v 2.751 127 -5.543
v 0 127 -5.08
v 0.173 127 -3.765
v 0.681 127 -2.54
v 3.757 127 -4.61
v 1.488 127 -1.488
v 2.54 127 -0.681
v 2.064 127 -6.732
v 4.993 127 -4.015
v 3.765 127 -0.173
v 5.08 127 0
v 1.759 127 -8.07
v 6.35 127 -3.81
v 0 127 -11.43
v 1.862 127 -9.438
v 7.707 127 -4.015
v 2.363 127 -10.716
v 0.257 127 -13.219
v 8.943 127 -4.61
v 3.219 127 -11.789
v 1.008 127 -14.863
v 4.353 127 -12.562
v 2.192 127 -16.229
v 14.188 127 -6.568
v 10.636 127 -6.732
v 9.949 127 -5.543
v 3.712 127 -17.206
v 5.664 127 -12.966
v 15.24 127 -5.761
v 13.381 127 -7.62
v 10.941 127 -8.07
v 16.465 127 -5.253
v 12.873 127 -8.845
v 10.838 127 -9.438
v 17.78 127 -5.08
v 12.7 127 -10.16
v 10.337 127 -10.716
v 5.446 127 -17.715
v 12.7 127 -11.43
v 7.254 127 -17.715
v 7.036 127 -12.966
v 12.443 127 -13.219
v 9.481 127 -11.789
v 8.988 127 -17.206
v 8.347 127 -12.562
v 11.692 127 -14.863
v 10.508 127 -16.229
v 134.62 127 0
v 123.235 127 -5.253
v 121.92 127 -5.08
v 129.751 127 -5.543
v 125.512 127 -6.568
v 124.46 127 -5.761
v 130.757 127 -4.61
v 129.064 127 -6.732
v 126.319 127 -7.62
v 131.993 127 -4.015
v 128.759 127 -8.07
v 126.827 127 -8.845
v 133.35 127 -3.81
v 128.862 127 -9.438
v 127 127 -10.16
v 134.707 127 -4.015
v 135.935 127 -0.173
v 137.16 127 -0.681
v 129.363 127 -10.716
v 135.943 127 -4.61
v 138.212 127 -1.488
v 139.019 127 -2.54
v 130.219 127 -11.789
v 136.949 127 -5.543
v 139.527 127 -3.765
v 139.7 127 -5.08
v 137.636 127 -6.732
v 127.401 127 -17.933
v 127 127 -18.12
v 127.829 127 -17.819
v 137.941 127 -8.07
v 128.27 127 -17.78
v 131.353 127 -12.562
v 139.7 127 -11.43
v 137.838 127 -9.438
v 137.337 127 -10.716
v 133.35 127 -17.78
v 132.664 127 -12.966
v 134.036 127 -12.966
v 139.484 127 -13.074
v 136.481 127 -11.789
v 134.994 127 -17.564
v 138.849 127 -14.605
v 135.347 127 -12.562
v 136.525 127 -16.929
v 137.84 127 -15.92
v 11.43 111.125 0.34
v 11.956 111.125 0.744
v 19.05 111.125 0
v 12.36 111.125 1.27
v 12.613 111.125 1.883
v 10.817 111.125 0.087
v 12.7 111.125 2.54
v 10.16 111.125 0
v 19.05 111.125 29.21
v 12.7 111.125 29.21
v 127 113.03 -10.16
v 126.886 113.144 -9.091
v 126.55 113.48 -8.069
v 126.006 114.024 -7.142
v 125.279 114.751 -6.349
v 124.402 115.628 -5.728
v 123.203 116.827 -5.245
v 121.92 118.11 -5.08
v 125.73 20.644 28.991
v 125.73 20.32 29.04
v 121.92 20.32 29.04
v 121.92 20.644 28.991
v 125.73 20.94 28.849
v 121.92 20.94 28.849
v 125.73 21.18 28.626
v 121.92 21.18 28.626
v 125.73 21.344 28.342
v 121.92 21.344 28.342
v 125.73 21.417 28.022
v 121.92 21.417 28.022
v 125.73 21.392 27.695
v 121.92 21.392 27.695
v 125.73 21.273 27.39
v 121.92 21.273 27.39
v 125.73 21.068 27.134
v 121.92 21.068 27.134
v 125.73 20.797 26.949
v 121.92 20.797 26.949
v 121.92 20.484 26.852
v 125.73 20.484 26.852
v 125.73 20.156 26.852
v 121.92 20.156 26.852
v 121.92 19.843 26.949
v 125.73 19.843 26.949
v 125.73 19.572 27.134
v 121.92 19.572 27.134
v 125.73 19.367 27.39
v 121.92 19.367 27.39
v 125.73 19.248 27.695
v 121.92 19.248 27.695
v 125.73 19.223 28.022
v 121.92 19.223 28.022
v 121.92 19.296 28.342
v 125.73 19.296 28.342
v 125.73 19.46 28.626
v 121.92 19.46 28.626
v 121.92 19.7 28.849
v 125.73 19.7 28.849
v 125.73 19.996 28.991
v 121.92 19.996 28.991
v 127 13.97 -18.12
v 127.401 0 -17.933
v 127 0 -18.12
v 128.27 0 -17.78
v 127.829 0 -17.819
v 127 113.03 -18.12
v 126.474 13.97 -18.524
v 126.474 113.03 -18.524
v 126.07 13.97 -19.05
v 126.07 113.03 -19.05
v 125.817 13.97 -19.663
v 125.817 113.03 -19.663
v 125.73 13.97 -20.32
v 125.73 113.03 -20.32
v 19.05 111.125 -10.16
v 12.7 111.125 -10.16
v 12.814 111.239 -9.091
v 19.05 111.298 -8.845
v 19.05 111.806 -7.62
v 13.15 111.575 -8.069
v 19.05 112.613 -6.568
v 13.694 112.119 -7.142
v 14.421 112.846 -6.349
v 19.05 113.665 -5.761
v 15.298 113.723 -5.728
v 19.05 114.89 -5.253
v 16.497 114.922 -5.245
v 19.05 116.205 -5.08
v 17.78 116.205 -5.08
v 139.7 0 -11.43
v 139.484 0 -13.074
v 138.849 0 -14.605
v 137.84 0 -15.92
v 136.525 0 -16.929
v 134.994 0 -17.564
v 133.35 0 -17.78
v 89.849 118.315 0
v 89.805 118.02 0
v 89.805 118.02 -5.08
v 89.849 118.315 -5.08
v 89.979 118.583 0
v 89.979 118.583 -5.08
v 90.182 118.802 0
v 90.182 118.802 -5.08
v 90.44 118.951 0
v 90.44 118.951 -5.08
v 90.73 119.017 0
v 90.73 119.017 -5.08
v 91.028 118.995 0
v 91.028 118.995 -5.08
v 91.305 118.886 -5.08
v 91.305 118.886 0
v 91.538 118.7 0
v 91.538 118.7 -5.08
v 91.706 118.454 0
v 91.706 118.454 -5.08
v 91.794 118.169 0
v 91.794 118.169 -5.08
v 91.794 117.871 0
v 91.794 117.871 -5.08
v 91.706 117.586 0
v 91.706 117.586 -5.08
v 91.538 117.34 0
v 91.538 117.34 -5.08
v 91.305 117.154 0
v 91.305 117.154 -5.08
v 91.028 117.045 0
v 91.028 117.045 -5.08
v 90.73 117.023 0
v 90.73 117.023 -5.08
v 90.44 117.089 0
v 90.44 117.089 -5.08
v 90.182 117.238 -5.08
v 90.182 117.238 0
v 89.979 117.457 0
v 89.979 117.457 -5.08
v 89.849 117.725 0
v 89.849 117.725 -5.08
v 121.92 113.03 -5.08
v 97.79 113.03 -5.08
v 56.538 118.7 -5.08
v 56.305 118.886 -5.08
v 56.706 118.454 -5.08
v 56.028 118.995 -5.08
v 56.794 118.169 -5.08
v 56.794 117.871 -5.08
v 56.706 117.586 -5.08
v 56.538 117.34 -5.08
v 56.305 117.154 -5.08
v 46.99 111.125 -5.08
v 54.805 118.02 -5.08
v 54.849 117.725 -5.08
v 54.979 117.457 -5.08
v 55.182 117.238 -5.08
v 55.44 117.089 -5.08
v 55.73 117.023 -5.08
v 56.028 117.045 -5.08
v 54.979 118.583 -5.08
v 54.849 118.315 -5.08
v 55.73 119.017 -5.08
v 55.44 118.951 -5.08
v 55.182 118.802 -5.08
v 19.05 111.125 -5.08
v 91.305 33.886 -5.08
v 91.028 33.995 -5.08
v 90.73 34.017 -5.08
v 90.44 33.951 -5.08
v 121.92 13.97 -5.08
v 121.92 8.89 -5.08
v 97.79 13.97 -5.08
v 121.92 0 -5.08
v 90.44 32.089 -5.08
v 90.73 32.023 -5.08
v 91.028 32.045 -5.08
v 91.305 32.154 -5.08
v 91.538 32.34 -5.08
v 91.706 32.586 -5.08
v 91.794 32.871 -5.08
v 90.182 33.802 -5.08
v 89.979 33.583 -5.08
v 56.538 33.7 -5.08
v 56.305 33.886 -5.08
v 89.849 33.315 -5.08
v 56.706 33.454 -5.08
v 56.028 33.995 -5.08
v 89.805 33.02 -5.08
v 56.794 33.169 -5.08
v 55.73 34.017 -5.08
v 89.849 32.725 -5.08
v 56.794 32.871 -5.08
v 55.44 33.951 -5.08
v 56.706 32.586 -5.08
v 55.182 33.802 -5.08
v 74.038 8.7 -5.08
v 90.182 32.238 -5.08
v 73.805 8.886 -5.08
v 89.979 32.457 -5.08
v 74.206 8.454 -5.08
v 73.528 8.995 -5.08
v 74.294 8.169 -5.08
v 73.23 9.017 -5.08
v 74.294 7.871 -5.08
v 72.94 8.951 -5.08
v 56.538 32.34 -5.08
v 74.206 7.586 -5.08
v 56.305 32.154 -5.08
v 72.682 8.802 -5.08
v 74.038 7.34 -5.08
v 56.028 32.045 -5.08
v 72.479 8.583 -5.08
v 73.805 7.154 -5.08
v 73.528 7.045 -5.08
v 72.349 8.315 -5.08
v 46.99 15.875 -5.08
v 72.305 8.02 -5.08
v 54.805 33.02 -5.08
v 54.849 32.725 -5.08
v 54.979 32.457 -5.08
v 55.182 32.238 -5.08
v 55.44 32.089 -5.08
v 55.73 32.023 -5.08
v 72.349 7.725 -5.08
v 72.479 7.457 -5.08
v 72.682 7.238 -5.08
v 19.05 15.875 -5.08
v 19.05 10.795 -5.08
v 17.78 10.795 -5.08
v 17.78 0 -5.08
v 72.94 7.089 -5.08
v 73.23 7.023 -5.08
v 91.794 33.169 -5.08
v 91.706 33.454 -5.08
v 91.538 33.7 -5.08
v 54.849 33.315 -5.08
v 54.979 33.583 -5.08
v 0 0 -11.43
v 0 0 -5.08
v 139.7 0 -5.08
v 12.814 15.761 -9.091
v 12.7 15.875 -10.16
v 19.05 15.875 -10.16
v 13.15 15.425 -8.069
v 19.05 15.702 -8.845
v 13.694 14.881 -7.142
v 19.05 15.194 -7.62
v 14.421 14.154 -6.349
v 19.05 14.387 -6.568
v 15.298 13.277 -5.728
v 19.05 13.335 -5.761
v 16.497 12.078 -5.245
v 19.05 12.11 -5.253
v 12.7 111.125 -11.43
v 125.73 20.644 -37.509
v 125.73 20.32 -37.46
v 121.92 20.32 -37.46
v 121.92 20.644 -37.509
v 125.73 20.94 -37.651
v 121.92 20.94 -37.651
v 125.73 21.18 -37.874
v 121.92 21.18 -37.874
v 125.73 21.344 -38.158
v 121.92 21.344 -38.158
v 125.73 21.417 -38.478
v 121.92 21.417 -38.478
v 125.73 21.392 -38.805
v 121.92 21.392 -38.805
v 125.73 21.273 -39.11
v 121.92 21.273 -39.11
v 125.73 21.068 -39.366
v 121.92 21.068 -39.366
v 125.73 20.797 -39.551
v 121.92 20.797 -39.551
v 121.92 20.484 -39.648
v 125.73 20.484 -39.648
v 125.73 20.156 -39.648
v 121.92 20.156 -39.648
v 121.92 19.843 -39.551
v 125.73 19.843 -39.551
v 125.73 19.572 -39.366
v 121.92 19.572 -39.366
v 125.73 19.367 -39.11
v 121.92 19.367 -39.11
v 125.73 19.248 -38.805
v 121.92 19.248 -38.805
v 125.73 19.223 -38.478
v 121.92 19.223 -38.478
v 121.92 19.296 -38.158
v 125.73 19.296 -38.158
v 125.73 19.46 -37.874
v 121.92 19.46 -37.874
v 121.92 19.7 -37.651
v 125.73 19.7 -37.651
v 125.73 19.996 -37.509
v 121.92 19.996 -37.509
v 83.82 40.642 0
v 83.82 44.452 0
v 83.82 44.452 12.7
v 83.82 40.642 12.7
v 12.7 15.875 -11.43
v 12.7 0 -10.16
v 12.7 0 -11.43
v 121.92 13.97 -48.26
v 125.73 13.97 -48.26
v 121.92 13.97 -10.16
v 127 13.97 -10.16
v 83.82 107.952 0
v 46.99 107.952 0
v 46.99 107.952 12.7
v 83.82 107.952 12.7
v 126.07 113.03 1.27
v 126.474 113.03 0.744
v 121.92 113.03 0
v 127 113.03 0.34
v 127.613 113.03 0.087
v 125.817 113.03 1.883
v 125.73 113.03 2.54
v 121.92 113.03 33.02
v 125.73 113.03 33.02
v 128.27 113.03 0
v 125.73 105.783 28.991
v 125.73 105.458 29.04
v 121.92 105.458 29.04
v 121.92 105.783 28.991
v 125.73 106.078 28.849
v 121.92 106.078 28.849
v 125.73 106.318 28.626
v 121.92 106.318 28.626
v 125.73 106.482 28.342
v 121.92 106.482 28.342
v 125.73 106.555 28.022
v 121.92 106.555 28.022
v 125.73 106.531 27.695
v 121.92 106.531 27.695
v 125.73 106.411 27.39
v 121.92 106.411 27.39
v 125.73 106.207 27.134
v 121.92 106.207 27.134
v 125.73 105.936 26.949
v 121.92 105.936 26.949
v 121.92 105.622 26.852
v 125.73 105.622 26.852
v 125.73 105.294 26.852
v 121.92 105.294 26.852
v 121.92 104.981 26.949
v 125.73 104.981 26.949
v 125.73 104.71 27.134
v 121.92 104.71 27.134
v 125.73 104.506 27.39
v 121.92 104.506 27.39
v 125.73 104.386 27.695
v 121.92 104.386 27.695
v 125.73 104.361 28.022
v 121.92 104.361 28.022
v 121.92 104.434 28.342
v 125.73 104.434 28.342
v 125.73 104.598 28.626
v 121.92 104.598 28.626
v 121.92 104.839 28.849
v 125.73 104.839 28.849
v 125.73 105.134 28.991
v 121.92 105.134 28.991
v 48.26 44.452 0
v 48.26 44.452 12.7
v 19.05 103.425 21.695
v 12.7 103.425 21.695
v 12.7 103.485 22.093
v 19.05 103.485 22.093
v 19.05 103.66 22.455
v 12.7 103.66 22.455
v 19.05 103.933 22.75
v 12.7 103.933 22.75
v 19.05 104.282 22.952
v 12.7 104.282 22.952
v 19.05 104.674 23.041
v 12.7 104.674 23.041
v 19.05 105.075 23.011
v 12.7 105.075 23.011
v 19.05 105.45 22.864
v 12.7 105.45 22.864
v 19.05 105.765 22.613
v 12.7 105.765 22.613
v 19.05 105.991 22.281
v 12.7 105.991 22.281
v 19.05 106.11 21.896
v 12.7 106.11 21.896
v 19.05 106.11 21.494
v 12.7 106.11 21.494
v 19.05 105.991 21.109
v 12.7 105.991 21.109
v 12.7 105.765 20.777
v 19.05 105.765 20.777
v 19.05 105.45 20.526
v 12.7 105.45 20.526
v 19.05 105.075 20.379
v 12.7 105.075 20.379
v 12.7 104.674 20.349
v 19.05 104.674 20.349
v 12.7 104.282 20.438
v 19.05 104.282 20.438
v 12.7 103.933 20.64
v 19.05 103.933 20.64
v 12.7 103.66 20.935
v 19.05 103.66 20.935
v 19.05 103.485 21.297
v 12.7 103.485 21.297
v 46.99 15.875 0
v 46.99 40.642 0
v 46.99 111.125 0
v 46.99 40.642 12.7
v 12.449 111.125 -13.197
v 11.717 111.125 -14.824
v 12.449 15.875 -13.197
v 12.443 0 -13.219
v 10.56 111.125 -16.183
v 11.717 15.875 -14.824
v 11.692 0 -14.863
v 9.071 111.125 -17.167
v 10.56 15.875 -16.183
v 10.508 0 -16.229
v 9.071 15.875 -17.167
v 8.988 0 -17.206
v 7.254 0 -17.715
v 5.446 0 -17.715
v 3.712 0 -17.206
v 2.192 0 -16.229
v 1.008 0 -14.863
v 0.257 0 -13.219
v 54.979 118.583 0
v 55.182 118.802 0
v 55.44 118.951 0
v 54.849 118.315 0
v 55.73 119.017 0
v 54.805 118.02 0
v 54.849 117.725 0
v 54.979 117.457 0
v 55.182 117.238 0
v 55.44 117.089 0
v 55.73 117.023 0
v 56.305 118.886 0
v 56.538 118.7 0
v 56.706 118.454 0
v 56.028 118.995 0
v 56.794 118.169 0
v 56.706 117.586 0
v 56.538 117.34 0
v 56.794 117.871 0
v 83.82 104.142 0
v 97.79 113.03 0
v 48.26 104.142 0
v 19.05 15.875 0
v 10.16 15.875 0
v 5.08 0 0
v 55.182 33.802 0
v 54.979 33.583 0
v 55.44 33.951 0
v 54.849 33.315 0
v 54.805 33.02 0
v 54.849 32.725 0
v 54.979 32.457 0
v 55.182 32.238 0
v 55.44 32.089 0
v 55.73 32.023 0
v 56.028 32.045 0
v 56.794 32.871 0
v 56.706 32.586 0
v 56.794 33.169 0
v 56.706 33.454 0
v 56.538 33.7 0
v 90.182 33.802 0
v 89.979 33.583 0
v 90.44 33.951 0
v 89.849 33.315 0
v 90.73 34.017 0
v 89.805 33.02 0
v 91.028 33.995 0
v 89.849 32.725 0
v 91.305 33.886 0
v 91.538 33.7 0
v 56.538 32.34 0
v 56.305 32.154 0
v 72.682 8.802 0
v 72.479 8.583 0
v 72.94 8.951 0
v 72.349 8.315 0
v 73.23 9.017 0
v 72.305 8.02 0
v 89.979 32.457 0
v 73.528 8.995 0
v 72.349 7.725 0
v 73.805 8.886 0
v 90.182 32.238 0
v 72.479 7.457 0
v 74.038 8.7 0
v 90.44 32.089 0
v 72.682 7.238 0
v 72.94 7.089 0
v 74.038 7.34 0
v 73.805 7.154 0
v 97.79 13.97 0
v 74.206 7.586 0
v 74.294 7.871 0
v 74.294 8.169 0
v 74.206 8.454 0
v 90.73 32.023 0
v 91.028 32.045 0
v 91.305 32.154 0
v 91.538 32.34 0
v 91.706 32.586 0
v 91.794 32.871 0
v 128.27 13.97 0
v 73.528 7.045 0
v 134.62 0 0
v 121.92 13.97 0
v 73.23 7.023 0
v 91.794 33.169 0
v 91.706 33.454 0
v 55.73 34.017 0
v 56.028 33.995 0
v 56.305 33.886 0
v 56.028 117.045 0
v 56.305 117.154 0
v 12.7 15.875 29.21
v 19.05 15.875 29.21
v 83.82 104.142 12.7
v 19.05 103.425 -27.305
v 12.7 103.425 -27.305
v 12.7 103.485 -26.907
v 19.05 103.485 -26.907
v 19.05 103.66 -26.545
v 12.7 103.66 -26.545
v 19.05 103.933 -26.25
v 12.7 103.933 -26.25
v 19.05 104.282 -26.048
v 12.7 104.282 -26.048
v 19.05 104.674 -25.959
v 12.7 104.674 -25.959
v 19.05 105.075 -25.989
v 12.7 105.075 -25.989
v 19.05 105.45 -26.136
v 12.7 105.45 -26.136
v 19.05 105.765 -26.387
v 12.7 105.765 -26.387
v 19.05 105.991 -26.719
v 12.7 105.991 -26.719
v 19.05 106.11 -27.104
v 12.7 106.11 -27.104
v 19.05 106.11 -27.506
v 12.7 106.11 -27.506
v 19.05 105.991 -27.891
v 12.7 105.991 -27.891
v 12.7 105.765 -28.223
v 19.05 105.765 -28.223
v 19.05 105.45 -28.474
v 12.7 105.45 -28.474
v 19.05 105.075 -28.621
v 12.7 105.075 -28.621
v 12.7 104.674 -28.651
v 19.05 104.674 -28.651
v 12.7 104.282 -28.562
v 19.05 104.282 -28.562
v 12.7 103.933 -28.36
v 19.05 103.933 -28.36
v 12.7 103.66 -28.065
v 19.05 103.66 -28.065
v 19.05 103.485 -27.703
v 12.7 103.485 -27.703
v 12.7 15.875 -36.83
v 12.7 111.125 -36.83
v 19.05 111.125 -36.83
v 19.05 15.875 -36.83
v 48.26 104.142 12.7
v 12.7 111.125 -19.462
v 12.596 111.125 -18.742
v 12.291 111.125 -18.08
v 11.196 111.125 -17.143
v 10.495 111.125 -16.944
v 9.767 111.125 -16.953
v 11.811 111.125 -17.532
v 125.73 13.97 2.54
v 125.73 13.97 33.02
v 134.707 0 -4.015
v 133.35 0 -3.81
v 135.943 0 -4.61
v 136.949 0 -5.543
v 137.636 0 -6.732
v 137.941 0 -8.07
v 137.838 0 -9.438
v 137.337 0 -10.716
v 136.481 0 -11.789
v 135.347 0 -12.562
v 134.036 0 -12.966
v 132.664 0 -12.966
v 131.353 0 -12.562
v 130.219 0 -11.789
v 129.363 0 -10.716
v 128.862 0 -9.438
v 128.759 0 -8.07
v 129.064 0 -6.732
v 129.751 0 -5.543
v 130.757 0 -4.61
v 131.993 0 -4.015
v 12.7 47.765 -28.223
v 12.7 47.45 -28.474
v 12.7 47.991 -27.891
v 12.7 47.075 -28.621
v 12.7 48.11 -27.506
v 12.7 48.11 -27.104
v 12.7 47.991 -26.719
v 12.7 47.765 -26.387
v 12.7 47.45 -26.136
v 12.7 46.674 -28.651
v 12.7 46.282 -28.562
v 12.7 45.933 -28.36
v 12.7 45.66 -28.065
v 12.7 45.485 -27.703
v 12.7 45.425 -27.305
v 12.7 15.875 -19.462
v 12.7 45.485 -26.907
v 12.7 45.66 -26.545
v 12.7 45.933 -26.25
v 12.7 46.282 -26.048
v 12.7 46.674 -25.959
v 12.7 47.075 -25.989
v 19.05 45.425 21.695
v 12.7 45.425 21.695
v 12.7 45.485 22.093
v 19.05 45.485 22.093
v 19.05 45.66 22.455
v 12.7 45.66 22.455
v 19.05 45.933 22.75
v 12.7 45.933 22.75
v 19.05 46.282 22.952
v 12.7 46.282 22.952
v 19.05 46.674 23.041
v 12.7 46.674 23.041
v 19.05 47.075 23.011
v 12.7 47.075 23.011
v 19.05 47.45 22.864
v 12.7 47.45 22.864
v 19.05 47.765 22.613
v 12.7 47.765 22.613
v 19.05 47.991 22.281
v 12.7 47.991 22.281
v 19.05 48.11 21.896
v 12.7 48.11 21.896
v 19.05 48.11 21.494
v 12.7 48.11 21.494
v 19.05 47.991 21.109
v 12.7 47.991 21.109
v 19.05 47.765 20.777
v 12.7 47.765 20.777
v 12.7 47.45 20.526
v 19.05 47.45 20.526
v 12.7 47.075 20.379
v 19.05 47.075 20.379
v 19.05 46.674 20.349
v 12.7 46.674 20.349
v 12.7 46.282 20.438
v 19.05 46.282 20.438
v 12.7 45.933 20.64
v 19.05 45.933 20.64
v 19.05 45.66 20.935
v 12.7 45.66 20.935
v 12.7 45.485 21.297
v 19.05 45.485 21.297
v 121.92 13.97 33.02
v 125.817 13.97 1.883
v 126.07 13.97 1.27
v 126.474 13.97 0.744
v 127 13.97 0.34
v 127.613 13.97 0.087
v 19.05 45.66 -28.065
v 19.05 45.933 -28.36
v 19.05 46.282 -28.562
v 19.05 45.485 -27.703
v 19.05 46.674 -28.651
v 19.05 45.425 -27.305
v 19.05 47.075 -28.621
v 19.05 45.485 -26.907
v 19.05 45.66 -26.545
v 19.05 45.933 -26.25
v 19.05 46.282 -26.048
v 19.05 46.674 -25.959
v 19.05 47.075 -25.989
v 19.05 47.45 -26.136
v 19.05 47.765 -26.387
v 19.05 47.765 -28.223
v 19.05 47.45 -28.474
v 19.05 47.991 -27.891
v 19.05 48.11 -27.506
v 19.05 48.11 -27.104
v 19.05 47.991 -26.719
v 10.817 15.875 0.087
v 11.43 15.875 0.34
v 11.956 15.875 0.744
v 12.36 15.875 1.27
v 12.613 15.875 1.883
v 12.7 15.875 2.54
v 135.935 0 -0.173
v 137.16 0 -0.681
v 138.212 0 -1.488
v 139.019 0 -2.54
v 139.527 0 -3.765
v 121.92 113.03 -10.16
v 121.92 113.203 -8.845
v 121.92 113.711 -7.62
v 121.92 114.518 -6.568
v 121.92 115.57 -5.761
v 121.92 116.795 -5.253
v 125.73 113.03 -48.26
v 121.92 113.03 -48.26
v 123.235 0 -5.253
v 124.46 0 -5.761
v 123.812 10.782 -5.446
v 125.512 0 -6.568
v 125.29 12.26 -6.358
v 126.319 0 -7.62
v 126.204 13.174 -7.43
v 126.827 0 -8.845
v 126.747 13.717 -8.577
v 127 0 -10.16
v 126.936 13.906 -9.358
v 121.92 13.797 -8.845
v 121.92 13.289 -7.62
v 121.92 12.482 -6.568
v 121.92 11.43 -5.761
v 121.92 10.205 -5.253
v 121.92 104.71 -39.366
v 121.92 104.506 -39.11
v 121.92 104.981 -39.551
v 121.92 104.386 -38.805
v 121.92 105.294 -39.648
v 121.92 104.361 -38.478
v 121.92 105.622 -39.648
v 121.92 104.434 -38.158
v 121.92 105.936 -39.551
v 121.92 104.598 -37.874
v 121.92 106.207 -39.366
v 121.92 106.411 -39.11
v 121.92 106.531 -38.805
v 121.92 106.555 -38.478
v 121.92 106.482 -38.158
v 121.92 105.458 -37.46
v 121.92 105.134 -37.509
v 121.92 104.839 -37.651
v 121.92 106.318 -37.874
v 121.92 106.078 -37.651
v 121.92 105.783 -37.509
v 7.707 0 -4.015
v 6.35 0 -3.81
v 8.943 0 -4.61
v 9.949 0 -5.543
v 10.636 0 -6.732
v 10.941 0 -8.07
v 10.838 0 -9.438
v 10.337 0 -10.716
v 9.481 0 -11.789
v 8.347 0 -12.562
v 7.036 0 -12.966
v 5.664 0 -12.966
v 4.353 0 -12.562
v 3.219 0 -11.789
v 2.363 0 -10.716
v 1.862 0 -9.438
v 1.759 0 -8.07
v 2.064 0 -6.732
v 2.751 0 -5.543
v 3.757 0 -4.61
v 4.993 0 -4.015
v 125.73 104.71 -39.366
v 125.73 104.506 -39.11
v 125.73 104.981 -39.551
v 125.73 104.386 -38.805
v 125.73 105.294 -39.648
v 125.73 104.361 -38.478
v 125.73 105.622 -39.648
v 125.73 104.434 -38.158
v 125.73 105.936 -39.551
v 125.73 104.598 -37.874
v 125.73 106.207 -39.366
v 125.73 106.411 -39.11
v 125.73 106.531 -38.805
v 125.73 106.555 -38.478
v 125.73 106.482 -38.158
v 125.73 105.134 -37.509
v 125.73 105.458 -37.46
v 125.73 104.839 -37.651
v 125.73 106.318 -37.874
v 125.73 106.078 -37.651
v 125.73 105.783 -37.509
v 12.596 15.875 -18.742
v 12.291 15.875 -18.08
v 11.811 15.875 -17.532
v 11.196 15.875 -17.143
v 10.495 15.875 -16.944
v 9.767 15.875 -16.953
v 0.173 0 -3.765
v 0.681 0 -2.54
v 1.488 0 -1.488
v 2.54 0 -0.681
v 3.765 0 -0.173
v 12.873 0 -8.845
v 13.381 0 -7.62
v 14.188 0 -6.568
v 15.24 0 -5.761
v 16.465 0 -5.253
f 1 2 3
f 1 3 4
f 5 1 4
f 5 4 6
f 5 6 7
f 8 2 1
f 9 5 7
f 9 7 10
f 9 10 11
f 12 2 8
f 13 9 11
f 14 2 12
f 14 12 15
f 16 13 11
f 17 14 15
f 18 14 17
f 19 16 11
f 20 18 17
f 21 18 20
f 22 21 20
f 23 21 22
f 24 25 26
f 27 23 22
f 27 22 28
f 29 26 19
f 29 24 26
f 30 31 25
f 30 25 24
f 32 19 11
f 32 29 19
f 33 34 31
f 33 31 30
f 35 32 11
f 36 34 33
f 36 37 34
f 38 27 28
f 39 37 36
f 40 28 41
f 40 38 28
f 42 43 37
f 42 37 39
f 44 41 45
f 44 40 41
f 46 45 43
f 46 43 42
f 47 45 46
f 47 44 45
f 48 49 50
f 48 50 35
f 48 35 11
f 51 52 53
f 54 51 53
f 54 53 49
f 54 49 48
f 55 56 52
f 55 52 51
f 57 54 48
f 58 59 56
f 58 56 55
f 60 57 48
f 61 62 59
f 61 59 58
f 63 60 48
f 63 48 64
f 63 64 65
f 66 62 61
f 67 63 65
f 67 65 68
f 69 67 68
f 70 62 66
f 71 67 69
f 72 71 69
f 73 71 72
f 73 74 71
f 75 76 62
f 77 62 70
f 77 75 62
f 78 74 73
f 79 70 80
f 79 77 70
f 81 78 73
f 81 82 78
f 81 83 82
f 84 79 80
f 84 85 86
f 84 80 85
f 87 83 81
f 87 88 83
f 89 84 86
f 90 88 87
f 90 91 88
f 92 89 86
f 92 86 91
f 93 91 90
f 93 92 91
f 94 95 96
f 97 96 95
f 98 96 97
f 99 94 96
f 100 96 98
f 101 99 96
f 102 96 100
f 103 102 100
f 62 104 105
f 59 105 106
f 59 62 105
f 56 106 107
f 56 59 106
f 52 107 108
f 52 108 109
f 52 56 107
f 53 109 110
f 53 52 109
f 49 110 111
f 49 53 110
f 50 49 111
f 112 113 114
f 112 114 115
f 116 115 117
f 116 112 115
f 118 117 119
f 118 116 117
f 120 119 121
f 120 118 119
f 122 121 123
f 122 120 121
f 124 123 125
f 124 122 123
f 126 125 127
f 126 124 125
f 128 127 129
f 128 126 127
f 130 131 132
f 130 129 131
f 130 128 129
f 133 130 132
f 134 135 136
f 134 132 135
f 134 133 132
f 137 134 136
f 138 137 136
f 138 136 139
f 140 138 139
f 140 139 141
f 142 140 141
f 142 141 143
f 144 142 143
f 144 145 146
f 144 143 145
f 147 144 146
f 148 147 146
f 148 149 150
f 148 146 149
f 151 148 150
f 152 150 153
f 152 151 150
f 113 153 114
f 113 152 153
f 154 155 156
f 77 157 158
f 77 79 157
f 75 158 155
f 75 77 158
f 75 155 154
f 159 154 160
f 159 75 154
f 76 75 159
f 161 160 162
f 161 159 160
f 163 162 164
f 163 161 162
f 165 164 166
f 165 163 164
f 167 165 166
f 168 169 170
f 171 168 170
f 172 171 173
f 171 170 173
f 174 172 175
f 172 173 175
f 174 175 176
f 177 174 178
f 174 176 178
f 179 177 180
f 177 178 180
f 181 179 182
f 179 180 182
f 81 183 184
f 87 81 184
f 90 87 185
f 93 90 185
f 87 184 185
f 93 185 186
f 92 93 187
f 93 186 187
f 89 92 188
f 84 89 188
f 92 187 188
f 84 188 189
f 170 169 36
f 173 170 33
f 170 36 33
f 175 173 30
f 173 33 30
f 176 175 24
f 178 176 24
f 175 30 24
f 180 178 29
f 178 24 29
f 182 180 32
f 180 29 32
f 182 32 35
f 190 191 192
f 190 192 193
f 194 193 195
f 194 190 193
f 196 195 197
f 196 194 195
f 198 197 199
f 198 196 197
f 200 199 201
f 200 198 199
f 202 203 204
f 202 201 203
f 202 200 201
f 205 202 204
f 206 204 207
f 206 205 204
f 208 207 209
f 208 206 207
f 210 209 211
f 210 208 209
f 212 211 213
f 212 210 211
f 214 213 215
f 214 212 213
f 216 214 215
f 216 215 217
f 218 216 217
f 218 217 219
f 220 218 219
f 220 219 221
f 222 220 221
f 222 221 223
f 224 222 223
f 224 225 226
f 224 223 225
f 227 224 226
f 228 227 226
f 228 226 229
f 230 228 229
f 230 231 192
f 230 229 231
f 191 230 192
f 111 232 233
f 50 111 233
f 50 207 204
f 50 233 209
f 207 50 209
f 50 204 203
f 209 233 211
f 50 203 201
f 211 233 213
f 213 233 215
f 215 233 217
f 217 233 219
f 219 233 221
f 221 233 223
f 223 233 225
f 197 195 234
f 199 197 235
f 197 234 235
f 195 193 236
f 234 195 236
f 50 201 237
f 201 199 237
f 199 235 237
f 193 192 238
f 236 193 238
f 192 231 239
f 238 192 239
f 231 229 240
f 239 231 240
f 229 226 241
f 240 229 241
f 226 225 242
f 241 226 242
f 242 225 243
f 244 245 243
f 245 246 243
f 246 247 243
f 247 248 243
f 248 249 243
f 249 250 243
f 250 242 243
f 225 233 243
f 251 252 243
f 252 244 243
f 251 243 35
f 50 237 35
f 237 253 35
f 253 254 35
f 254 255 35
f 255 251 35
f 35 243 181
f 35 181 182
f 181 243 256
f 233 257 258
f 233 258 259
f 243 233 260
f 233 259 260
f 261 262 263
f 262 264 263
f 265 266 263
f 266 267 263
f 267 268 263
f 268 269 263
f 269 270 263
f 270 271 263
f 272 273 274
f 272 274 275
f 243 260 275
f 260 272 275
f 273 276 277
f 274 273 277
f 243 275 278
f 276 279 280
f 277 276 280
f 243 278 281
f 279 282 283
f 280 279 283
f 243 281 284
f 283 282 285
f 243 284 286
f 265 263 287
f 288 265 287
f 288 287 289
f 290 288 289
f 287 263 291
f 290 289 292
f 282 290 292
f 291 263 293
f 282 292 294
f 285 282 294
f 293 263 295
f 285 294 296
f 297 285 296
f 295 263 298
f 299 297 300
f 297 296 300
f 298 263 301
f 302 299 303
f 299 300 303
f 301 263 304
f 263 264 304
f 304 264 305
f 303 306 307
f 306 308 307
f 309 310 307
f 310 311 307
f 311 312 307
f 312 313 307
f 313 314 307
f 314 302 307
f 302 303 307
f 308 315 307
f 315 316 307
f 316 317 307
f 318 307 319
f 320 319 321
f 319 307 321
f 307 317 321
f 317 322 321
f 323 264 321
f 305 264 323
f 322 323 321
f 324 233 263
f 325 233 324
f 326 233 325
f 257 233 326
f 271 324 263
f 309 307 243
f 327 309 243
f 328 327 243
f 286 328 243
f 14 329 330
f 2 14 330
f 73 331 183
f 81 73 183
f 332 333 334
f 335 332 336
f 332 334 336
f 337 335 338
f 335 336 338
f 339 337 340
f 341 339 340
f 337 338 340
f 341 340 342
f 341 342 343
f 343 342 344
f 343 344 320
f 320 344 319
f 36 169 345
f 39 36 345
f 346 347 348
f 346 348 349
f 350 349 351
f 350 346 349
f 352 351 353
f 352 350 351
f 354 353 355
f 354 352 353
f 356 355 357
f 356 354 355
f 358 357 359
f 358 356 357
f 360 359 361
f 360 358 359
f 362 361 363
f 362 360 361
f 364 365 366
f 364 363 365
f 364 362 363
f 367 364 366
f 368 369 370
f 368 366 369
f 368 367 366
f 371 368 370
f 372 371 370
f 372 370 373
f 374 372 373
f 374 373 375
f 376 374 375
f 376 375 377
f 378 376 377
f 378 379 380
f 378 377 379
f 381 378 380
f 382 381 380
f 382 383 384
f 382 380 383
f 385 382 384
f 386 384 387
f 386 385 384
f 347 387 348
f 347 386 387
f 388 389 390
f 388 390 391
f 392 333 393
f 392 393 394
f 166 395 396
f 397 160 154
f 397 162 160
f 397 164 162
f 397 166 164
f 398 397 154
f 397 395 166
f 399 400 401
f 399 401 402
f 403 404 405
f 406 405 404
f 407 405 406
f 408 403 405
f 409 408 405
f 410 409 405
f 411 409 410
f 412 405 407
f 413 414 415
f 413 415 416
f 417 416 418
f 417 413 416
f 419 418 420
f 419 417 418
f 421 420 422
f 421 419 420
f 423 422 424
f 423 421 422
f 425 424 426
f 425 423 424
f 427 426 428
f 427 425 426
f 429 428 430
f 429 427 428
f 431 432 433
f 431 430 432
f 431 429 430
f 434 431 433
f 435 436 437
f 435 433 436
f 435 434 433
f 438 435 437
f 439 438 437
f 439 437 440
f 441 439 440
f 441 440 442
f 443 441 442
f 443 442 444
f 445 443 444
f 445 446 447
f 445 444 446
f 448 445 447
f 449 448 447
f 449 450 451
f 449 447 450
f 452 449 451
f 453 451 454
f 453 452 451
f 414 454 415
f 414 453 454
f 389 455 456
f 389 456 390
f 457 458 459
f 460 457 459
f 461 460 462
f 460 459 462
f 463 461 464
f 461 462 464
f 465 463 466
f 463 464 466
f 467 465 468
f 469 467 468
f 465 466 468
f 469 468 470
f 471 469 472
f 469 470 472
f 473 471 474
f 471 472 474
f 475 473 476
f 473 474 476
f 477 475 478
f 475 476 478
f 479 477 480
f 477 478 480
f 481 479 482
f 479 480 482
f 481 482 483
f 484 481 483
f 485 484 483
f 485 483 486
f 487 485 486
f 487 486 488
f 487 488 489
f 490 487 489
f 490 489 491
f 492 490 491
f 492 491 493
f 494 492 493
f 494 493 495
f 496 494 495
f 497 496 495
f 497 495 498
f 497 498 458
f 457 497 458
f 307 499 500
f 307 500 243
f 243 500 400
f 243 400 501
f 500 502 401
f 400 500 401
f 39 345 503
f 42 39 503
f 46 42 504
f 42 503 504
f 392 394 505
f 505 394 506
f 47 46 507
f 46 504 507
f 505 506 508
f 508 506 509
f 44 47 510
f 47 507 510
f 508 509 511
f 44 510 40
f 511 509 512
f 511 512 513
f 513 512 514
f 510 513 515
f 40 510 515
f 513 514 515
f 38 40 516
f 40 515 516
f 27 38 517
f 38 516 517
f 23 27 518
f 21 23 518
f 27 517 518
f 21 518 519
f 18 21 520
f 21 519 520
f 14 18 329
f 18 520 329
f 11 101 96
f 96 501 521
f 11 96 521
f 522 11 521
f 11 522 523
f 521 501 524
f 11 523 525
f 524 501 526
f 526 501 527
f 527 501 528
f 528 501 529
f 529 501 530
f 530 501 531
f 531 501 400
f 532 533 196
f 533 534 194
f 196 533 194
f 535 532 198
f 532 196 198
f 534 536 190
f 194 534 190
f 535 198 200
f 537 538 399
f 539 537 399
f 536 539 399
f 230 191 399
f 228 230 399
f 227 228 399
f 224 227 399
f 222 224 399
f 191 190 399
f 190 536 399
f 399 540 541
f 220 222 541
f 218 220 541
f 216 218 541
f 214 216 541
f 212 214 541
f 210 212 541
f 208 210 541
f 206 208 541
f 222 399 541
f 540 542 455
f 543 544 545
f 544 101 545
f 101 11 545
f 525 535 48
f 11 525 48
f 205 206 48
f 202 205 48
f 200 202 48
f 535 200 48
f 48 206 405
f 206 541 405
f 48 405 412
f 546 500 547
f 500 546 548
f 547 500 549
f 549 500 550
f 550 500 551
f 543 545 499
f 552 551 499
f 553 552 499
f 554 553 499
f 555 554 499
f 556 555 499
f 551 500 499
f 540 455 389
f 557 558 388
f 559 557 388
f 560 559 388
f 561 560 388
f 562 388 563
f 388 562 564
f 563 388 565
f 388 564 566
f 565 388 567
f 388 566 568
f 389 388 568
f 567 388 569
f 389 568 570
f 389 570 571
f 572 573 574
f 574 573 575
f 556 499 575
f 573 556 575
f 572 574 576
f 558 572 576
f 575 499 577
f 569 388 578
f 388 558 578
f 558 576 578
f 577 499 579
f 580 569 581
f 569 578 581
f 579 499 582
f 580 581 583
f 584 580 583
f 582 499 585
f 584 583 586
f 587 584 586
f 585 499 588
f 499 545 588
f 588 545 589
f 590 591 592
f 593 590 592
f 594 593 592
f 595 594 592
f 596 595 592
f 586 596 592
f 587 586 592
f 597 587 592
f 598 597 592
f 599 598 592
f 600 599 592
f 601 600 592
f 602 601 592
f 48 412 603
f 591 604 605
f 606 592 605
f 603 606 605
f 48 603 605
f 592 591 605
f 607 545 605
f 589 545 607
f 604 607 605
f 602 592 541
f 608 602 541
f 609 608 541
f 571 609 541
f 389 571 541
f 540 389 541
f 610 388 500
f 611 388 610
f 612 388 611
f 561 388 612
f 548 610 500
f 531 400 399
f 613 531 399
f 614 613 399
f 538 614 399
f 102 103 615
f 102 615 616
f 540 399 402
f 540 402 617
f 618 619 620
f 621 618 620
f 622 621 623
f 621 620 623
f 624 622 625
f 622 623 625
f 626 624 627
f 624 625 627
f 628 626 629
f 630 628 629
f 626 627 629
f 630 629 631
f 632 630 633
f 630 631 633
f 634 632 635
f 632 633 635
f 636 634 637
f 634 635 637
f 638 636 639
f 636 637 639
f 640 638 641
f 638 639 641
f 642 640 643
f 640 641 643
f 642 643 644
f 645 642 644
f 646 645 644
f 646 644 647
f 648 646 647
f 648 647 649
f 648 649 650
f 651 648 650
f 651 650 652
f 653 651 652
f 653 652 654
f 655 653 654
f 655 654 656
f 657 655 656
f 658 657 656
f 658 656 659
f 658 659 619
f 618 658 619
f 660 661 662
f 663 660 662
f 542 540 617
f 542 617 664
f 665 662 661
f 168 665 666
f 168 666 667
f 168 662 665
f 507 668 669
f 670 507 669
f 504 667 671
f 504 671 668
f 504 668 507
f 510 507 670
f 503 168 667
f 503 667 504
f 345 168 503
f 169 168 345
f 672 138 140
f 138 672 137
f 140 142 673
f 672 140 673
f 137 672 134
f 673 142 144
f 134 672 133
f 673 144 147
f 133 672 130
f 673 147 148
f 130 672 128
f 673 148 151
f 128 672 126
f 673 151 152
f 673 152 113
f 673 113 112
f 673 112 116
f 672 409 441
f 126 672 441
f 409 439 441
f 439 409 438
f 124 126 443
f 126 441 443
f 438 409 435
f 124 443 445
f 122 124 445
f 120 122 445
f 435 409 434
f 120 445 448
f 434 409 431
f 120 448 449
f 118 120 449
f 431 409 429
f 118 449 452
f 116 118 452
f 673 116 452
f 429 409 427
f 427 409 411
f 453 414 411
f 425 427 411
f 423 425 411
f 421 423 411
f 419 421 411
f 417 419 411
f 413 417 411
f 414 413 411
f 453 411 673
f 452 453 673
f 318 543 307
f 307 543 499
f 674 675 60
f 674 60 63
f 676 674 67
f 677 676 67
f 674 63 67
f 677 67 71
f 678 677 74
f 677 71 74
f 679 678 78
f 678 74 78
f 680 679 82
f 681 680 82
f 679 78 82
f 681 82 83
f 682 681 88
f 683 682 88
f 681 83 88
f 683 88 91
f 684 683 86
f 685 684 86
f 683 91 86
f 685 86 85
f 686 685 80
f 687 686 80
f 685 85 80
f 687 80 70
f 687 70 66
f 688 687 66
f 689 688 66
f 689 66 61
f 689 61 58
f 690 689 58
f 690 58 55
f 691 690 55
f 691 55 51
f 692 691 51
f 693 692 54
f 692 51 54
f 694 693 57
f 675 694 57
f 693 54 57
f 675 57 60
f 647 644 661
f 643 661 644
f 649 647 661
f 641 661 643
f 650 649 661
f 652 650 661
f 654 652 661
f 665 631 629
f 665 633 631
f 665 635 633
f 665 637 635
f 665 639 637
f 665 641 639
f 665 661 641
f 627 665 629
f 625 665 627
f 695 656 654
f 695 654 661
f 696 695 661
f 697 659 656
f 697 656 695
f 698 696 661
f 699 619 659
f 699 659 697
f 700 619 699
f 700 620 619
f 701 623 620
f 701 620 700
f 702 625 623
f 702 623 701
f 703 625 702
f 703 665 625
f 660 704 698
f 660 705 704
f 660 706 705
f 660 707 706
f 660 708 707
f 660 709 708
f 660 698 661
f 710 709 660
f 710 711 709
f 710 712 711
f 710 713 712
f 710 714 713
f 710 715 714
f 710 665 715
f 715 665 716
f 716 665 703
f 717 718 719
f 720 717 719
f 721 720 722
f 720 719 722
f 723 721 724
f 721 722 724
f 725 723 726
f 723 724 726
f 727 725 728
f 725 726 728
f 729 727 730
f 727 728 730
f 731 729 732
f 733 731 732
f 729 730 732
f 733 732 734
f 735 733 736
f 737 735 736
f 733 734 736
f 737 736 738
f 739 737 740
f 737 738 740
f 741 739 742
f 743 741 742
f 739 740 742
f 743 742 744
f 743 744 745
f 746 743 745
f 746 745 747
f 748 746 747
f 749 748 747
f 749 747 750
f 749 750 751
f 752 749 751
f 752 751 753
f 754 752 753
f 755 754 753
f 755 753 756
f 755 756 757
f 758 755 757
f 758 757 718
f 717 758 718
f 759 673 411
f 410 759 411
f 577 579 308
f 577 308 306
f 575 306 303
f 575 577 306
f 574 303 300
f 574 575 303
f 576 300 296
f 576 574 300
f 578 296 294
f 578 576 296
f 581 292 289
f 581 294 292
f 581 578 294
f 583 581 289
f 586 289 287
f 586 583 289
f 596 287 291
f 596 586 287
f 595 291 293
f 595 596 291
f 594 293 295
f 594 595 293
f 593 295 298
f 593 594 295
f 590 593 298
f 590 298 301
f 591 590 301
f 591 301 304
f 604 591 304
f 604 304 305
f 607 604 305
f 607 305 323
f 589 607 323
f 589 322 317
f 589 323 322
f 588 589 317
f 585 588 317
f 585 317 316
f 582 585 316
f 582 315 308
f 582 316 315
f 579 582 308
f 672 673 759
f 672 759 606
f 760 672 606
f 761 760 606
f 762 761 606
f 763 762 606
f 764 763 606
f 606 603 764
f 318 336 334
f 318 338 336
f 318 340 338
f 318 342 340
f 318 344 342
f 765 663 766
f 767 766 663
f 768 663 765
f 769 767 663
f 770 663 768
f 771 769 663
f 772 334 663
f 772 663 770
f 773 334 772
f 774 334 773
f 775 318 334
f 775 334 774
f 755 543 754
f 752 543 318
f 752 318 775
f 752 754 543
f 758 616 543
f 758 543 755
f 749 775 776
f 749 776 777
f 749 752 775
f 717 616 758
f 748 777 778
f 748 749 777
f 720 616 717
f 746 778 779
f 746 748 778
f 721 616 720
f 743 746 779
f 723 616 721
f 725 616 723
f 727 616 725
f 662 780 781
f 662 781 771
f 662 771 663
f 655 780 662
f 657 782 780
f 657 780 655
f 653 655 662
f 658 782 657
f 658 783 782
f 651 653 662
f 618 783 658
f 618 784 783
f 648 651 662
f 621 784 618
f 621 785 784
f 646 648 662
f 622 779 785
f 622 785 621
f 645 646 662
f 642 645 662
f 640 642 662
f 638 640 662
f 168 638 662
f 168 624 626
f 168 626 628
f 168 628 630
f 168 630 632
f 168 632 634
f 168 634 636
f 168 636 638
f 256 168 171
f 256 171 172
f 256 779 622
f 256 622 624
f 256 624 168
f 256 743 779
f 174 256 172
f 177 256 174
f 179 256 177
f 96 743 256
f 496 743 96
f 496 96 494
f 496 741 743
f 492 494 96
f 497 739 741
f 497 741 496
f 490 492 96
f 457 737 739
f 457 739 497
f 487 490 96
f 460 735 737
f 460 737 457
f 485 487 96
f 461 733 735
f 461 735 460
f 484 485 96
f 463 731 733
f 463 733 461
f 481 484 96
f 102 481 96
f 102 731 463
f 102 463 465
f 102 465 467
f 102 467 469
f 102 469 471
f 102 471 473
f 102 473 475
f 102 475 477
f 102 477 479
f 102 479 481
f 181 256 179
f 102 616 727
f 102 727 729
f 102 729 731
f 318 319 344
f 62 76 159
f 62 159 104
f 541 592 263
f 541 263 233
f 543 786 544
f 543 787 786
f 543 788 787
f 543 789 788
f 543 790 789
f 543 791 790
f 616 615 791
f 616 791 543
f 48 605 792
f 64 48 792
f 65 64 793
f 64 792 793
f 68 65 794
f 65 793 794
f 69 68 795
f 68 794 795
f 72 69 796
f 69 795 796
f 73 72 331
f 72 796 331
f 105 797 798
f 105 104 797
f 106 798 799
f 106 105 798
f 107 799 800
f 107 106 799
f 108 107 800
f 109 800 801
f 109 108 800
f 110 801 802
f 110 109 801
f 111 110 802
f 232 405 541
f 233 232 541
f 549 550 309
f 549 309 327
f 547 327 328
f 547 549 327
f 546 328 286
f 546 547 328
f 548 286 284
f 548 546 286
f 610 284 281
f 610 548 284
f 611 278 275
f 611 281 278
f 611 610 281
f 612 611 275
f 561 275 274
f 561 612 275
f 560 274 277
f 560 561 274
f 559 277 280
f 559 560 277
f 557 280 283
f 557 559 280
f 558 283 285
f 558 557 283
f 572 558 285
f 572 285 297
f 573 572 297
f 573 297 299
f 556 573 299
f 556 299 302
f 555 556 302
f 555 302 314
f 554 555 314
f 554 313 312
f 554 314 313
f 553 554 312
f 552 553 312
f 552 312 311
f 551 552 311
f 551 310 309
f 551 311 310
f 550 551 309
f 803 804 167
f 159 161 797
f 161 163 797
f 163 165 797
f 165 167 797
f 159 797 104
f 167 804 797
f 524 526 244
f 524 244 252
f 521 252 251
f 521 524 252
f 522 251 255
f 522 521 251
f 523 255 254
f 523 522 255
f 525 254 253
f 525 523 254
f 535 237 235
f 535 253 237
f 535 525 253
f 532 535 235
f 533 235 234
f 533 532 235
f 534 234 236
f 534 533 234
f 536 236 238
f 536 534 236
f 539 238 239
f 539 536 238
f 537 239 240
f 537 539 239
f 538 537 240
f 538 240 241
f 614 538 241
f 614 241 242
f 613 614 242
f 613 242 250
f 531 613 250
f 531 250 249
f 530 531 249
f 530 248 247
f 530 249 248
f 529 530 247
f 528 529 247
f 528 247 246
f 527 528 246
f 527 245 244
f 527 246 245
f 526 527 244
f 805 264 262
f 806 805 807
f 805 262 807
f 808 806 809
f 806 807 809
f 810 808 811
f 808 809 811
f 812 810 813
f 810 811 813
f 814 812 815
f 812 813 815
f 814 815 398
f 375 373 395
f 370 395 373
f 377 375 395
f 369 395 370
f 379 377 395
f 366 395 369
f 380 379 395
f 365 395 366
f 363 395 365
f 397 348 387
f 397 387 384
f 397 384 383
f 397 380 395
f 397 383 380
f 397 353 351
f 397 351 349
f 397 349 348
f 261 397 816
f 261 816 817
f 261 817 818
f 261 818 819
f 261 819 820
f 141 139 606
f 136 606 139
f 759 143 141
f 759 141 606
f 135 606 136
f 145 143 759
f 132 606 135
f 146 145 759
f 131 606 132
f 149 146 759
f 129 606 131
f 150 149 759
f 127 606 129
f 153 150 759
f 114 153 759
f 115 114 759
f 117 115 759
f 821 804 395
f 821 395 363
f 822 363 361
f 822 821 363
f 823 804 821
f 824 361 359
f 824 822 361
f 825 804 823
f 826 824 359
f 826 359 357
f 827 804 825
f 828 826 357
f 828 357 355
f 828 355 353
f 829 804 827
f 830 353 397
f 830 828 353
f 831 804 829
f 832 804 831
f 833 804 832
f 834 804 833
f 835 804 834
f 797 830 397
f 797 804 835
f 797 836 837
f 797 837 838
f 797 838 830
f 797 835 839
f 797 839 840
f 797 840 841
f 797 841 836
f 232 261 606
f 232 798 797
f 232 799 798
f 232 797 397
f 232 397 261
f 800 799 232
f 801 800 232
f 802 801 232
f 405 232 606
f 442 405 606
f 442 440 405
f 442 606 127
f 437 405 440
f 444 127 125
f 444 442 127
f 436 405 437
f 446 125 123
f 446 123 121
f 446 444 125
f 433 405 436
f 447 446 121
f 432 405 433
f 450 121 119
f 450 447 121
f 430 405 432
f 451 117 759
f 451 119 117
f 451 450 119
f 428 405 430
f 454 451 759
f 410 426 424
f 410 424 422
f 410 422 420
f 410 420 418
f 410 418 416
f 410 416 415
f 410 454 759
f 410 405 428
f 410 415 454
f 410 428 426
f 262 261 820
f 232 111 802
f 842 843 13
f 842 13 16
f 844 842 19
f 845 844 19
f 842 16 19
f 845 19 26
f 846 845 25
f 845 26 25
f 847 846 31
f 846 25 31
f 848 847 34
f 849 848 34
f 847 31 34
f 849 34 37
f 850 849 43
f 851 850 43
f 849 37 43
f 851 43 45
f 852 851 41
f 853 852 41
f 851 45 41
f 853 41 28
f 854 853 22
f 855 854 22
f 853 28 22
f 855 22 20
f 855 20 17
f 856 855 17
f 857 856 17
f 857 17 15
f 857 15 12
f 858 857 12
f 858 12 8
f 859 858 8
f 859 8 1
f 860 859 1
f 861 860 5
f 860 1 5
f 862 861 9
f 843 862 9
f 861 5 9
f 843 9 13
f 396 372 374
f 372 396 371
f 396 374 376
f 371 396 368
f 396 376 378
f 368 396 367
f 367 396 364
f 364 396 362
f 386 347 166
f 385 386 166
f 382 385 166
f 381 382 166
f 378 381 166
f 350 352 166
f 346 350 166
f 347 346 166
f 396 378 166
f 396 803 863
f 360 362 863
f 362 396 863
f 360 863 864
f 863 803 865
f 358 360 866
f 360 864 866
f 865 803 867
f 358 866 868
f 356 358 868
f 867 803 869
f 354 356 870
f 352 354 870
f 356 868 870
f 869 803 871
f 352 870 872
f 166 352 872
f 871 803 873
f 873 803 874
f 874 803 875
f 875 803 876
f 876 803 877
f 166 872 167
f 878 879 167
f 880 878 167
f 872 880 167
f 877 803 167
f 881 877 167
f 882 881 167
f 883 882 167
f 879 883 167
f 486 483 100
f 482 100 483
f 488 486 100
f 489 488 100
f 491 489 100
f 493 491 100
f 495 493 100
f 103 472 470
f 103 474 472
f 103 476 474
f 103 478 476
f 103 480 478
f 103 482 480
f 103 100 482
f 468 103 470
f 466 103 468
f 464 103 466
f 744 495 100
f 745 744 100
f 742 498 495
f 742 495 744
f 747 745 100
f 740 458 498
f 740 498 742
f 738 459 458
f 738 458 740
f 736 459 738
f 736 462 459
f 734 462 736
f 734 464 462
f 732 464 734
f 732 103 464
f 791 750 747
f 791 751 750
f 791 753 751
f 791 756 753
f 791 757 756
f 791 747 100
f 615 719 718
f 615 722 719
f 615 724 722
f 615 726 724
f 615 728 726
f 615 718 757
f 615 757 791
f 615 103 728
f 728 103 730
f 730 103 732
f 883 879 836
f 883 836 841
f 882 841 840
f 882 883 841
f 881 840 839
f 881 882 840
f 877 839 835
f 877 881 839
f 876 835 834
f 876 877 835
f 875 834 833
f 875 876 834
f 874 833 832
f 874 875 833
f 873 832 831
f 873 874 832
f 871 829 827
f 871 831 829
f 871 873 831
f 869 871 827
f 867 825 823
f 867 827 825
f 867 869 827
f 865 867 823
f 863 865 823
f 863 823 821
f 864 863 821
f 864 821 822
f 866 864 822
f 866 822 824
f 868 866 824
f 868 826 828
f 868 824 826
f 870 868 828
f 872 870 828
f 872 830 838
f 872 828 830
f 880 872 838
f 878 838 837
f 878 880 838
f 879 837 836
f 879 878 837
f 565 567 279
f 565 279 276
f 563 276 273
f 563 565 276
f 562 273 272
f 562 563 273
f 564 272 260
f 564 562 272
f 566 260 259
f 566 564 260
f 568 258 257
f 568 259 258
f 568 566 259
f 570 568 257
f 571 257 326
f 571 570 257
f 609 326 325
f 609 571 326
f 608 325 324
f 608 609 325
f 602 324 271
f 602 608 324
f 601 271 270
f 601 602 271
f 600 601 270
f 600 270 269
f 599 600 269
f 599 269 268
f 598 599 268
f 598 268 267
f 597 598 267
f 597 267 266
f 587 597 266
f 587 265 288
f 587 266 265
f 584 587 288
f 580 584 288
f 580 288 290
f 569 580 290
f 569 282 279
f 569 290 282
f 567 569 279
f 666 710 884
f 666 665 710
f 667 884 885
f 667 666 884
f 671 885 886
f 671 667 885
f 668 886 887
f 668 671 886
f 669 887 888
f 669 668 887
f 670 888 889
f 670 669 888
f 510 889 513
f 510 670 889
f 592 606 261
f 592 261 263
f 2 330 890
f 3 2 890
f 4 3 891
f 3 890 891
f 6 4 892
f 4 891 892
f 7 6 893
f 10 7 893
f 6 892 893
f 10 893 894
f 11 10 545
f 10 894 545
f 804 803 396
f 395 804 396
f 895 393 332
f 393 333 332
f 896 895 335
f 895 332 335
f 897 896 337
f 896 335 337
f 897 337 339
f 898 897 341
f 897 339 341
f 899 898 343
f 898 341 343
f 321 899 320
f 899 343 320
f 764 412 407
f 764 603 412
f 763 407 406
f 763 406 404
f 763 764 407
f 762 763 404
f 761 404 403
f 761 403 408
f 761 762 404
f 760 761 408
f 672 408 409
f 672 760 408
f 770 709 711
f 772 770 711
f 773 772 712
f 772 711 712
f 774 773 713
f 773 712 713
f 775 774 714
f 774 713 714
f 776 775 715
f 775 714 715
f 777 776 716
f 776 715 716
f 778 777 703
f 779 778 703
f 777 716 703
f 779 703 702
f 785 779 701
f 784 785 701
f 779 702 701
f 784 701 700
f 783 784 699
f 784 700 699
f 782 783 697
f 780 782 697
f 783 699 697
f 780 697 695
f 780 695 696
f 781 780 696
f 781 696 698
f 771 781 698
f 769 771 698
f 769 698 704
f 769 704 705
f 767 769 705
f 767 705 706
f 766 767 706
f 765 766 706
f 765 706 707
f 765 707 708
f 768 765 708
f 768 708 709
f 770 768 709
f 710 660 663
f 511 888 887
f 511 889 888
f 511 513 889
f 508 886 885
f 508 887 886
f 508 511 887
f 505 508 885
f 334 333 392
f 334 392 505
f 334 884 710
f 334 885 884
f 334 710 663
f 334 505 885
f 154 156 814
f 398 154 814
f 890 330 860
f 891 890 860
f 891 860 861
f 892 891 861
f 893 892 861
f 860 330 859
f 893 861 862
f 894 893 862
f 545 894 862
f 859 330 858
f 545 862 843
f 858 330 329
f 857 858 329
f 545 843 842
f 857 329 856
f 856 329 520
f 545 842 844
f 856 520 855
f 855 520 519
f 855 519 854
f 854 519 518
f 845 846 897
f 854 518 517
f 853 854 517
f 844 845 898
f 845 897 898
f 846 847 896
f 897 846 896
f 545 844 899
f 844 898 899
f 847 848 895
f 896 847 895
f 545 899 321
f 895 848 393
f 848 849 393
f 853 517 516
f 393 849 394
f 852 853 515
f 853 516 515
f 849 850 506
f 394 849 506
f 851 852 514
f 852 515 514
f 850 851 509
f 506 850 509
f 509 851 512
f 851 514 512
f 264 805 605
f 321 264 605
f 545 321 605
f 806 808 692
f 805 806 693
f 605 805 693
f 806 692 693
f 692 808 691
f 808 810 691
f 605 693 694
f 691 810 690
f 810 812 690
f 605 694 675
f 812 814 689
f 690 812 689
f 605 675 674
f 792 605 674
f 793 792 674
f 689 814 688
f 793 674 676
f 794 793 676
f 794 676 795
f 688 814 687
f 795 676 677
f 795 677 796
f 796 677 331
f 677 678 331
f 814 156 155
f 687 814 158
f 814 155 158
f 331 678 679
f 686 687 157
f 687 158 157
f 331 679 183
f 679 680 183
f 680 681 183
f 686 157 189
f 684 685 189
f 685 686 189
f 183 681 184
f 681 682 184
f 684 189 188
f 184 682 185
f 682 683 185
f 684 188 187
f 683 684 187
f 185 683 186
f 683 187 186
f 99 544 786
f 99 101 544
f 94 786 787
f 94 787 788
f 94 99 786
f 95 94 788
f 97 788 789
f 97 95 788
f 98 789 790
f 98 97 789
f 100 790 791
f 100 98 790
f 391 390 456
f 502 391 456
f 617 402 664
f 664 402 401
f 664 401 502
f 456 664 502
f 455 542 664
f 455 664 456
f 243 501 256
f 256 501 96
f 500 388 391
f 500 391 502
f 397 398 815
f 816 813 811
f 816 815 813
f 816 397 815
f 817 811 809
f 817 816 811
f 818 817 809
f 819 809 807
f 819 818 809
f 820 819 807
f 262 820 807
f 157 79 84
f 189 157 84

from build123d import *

# Parameters (mm, degrees)
BOSS_EXTRUDE1_DEPTH      = 127
SKETCH3_R                = 4.60374999999995
SKETCH3_R_2              = 4.603749999999996
CUT_EXTRUDE1_DEPTH       = 127
CUT_EXTRUDE10_DEPTH      = 190.225738207042
CUT_EXTRUDE10_DEPTH_BACK = 190.225738207042
SKETCH19_W               = 27.939999999999998
SKETCH19_H               = 99.05999999999997
BOSS_EXTRUDE6_DEPTH      = 3.8099999999999996
CUT_EXTRUDE11_DEPTH      = 183.54455346572246
CUT_EXTRUDE11_DEPTH_BACK = 183.54455346572246
SKETCH23_R               = 1.0999978000000017
SKETCH23_R_2             = 1.0999978000000061
SKETCH23_R_3             = 1.099997799999995
BOSS_EXTRUDE8_DEPTH      = 31.75
BOSS_EXTRUDE8_DEPTH_BACK = 34.29
CUT_EXTRUDE12_DEPTH      = 194.67395901359583
CUT_EXTRUDE12_DEPTH_BACK = 194.67395901359583
CUT_EXTRUDE13_DEPTH      = 194.67395901359583
CUT_EXTRUDE13_DEPTH_BACK = 194.67395901359583
SKETCH32_R               = 0.9999980000000093
SKETCH34_R               = 1.3499972999999863
SKETCH34_R_2             = 1.349997299999995
SKETCH34_R_3             = 1.3499973000000016
CUT_EXTRUDE15_DEPTH      = 15.239999999999998
BOSS_EXTRUDE10_DEPTH     = 12.7
SKETCH36_W               = 1.2700000000000102
SKETCH36_H               = 12.700000000000014
BOSS_EXTRUDE11_DEPTH     = 99.06
FILLET5_R                = 2.54
FILLET6_R                = 2.54
FILLET7_R                = 5.08


with BuildPart() as part:
    # Sketch2 → Boss-Extrude1 (new body)
    with BuildSketch(Plane(origin=(0, 0, 0), x_dir=(1, 0, 0), z_dir=(0, 1, 0))):
        with BuildLine():
            Line((8.7e-16, 11.429999999999996), (8.7e-16, 5.079999999999999))
            ThreePointArc((8.7e-16, 5.079999999999999), (1.4878975515723396, 1.4878975515723383), (5.080000000000001, 0))
            Line((5.080000000000001, 0), (134.61999999999998, 0))
            ThreePointArc((134.61999999999998, 0), (138.21210244842763, 1.4878975515723387), (139.7, 5.08))
            Line((139.7, 5.08), (139.70000000000002, 11.429999999999996))
            ThreePointArc((139.70000000000002, 11.429999999999996), (137.8401280605346, 15.920128060534589), (133.35, 17.78000000000002))
            Line((133.35, 17.78000000000002), (127, 17.780000000000015))
            Line((127, 17.780000000000015), (127, 11.429999999999996))
            Line((127, 11.429999999999996), (127, 5.079999999999999))
            Line((127, 5.079999999999999), (12.699999999999989, 5.08))
            Line((12.699999999999989, 5.08), (12.699999999999989, 11.429999999999996))
            ThreePointArc((12.699999999999989, 11.429999999999996), (6.349999999999994, 17.77999999999999), (8.7e-16, 11.429999999999996))
        make_face()
    extrude(amount=BOSS_EXTRUDE1_DEPTH)

    # Sketch3 → Cut-Extrude1 (cut)
    with BuildSketch(Plane(origin=(0, 127, 0), x_dir=(1, 0, 0), z_dir=(0, 1, 0))):
        with Locations(Location((133.35, 8.41375, 0), (0, 0, 270))):
            Circle(SKETCH3_R)
        with Locations(Location((6.349999999999994, 8.41375, 0), (0, 0, 270))):
            Circle(SKETCH3_R_2)
    extrude(amount=-CUT_EXTRUDE1_DEPTH, mode=Mode.SUBTRACT)

    # Sketch19 → Cut-Extrude10 (cut, two sides: drawn at the far end of the back side and taken through both)
    with BuildSketch(Plane(origin=(4e-17, 0, -5.08), x_dir=(-1, 0, -1e-17), z_dir=(1e-17, 0, -1)).offset(-CUT_EXTRUDE10_DEPTH_BACK)):
        with Locations((-111.76, 63.5)):
            Rectangle(SKETCH19_W, SKETCH19_H)
    extrude(amount=CUT_EXTRUDE10_DEPTH + CUT_EXTRUDE10_DEPTH_BACK, mode=Mode.SUBTRACT)

    # Sketch20 → Boss-Extrude6 (add)
    with BuildSketch(Plane(origin=(125.73, 0, 9.5e-16), x_dir=(1e-17, 0, -1), z_dir=(1, 0, 1e-17))):
        Polygon((5.08, 113.02999999999999), (48.26, 113.02999999999999), (48.26000000000001, 13.97000000000001), (5.08, 13.97000000000001), (-1.06e-15, 13.97000000000001), (-33.01999999999999, 13.97000000000001), (-33.02, 113.02999999999999), (-1.06e-15, 113.02999999999999), align=None)
    extrude(amount=-BOSS_EXTRUDE6_DEPTH)

    # Sketch23 → Cut-Extrude11 (cut, two sides: drawn at the far end of the back side and taken through both)
    with BuildSketch(Plane.ZY.offset(-121.92000000000002).offset(-CUT_EXTRUDE11_DEPTH_BACK)):
        with Locations((27.94, 105.45831715747836)):
            Circle(SKETCH23_R)
        with Locations((27.94, 20.32000000000001)):
            Circle(SKETCH23_R_2)
        with Locations((-38.55999400000001, 20.32000000000001)):
            Circle(SKETCH23_R_3)
        with Locations((-38.55999400000001, 105.45831715747836)):
            Circle(SKETCH23_R_3)
    extrude(amount=CUT_EXTRUDE11_DEPTH + CUT_EXTRUDE11_DEPTH_BACK, mode=Mode.SUBTRACT)

    # Sketch26 → Boss-Extrude8 (add, two sides: drawn at the far end of the back side and taken through both)
    with BuildSketch(Plane(origin=(4e-17, 0, -5.08), x_dir=(-1, 0, -1e-17), z_dir=(1e-17, 0, -1)).offset(-BOSS_EXTRUDE8_DEPTH_BACK)):
        Polygon((-19.049999999999976, 111.125), (-12.699999999999976, 111.125), (-12.699999999999976, 15.875), (-19.049999999999955, 15.875), align=None)
    extrude(amount=BOSS_EXTRUDE8_DEPTH + BOSS_EXTRUDE8_DEPTH_BACK)

    # Sketch27 → Cut-Extrude12 (cut, two sides: drawn at the far end of the back side and taken through both)
    with BuildSketch(Plane(origin=(4e-17, 0, -5.08), x_dir=(-1, 0, -1e-17), z_dir=(1e-17, 0, -1)).offset(-CUT_EXTRUDE12_DEPTH_BACK)):
        Polygon((-19.049999999999976, 15.875), (-46.989999999999974, 15.874999999999996), (-46.989999999999974, 111.125), (-19.049999999999976, 111.125), align=None)
    extrude(amount=CUT_EXTRUDE12_DEPTH + CUT_EXTRUDE12_DEPTH_BACK, mode=Mode.SUBTRACT)

    # Sketch32 → Cut-Extrude13 (cut, two sides: drawn at the far end of the back side and taken through both)
    with BuildSketch(Plane(origin=(4e-17, 0, -5.08), x_dir=(-1, 0, -1e-17), z_dir=(1e-17, 0, -1)).offset(-CUT_EXTRUDE13_DEPTH_BACK)):
        with Locations((-90.80499999999999, 118.02000779999999)):
            Circle(SKETCH32_R)
        with Locations((-55.8049938, 118.02000779999999)):
            Circle(SKETCH32_R)
        with Locations((-55.8049938, 33.02)):
            Circle(SKETCH32_R)
        with Locations((-90.80499999999999, 33.02)):
            Circle(SKETCH32_R)
        with Locations((-73.3049969, 8.019999200000003)):
            Circle(SKETCH32_R)
    extrude(amount=CUT_EXTRUDE13_DEPTH + CUT_EXTRUDE13_DEPTH_BACK, mode=Mode.SUBTRACT)

    # Sketch34 → Cut-Extrude15 (cut)
    with BuildSketch(Plane.ZY.offset(-12.699999999999976)):
        with Locations(Location((-27.30500000000001, 104.775, 0), (0, 0, 270))):
            Circle(SKETCH34_R)
        with Locations(Location((21.695003599999986, 104.775, 0), (0, 0, 270))):
            Circle(SKETCH34_R)
        with Locations(Location((21.695003599999993, 46.774989000000026, 0), (0, 0, 270))):
            Circle(SKETCH34_R_2)
        with Locations(Location((-27.305000000000003, 46.77498900000001, 0), (0, 0, 270))):
            Circle(SKETCH34_R_3)
    extrude(amount=-CUT_EXTRUDE15_DEPTH, mode=Mode.SUBTRACT)

    # Sketch35 → Boss-Extrude10 (add)
    with BuildSketch(Plane.XY):
        Polygon((48.25999999999998, 104.14154915842353), (48.259999999999984, 44.45154915842352), (83.81999999999998, 44.451549158423525), (83.81999999999998, 40.64154915842352), (46.989999999999974, 40.641549158423516), (46.989999999999974, 107.95154915842352), (83.81999999999996, 107.95154915842353), (83.81999999999996, 104.14154915842353), align=None)
    extrude(amount=BOSS_EXTRUDE10_DEPTH)

    # Sketch36 → Boss-Extrude11 (add)
    with BuildSketch(Plane.XZ.offset(-13.97000000000001)):
        with Locations((126.36500000000001, -11.430000000000009)):
            Rectangle(SKETCH36_W, SKETCH36_H)
    extrude(amount=-BOSS_EXTRUDE11_DEPTH)

    # Fillet5
    fillet5_edges = [part.edges().sort_by_distance(p)[0] for p in [
        (12.699999999999989, 63.5, -11.429999999999996),
    ]]
    fillet(fillet5_edges, radius=FILLET5_R)

    # Fillet6
    fillet6_edges = [part.edges().sort_by_distance(p)[0] for p in [
        (125.73, 63.5, 0),
        (12.699999999999976, 63.5, 0),
        (125.73, 63.500000000000014, -17.780000000000015),
    ]]
    fillet(fillet6_edges, radius=FILLET6_R)

    # Fillet7
    fillet7_edges = [part.edges().sort_by_distance(p)[0] for p in [
        (12.699999999999989, 7.9375, -5.08),
        (15.874999999999986, 111.125, -5.08),
        (15.874999999999972, 15.875, -5.08),
        (12.699999999999989, 119.0625, -5.08),
        (127, 120.01500000000001, -5.079999999999999),
        (127, 6.985000000000005, -5.079999999999999),
        (124.46000000000001, 13.97000000000001, -5.08),
        (124.46000000000001, 113.03, -5.08),
    ]]
    fillet(fillet7_edges, radius=FILLET7_R - 0.0001)  # a hair under: the kernel refuses the full size


solid = part.part
